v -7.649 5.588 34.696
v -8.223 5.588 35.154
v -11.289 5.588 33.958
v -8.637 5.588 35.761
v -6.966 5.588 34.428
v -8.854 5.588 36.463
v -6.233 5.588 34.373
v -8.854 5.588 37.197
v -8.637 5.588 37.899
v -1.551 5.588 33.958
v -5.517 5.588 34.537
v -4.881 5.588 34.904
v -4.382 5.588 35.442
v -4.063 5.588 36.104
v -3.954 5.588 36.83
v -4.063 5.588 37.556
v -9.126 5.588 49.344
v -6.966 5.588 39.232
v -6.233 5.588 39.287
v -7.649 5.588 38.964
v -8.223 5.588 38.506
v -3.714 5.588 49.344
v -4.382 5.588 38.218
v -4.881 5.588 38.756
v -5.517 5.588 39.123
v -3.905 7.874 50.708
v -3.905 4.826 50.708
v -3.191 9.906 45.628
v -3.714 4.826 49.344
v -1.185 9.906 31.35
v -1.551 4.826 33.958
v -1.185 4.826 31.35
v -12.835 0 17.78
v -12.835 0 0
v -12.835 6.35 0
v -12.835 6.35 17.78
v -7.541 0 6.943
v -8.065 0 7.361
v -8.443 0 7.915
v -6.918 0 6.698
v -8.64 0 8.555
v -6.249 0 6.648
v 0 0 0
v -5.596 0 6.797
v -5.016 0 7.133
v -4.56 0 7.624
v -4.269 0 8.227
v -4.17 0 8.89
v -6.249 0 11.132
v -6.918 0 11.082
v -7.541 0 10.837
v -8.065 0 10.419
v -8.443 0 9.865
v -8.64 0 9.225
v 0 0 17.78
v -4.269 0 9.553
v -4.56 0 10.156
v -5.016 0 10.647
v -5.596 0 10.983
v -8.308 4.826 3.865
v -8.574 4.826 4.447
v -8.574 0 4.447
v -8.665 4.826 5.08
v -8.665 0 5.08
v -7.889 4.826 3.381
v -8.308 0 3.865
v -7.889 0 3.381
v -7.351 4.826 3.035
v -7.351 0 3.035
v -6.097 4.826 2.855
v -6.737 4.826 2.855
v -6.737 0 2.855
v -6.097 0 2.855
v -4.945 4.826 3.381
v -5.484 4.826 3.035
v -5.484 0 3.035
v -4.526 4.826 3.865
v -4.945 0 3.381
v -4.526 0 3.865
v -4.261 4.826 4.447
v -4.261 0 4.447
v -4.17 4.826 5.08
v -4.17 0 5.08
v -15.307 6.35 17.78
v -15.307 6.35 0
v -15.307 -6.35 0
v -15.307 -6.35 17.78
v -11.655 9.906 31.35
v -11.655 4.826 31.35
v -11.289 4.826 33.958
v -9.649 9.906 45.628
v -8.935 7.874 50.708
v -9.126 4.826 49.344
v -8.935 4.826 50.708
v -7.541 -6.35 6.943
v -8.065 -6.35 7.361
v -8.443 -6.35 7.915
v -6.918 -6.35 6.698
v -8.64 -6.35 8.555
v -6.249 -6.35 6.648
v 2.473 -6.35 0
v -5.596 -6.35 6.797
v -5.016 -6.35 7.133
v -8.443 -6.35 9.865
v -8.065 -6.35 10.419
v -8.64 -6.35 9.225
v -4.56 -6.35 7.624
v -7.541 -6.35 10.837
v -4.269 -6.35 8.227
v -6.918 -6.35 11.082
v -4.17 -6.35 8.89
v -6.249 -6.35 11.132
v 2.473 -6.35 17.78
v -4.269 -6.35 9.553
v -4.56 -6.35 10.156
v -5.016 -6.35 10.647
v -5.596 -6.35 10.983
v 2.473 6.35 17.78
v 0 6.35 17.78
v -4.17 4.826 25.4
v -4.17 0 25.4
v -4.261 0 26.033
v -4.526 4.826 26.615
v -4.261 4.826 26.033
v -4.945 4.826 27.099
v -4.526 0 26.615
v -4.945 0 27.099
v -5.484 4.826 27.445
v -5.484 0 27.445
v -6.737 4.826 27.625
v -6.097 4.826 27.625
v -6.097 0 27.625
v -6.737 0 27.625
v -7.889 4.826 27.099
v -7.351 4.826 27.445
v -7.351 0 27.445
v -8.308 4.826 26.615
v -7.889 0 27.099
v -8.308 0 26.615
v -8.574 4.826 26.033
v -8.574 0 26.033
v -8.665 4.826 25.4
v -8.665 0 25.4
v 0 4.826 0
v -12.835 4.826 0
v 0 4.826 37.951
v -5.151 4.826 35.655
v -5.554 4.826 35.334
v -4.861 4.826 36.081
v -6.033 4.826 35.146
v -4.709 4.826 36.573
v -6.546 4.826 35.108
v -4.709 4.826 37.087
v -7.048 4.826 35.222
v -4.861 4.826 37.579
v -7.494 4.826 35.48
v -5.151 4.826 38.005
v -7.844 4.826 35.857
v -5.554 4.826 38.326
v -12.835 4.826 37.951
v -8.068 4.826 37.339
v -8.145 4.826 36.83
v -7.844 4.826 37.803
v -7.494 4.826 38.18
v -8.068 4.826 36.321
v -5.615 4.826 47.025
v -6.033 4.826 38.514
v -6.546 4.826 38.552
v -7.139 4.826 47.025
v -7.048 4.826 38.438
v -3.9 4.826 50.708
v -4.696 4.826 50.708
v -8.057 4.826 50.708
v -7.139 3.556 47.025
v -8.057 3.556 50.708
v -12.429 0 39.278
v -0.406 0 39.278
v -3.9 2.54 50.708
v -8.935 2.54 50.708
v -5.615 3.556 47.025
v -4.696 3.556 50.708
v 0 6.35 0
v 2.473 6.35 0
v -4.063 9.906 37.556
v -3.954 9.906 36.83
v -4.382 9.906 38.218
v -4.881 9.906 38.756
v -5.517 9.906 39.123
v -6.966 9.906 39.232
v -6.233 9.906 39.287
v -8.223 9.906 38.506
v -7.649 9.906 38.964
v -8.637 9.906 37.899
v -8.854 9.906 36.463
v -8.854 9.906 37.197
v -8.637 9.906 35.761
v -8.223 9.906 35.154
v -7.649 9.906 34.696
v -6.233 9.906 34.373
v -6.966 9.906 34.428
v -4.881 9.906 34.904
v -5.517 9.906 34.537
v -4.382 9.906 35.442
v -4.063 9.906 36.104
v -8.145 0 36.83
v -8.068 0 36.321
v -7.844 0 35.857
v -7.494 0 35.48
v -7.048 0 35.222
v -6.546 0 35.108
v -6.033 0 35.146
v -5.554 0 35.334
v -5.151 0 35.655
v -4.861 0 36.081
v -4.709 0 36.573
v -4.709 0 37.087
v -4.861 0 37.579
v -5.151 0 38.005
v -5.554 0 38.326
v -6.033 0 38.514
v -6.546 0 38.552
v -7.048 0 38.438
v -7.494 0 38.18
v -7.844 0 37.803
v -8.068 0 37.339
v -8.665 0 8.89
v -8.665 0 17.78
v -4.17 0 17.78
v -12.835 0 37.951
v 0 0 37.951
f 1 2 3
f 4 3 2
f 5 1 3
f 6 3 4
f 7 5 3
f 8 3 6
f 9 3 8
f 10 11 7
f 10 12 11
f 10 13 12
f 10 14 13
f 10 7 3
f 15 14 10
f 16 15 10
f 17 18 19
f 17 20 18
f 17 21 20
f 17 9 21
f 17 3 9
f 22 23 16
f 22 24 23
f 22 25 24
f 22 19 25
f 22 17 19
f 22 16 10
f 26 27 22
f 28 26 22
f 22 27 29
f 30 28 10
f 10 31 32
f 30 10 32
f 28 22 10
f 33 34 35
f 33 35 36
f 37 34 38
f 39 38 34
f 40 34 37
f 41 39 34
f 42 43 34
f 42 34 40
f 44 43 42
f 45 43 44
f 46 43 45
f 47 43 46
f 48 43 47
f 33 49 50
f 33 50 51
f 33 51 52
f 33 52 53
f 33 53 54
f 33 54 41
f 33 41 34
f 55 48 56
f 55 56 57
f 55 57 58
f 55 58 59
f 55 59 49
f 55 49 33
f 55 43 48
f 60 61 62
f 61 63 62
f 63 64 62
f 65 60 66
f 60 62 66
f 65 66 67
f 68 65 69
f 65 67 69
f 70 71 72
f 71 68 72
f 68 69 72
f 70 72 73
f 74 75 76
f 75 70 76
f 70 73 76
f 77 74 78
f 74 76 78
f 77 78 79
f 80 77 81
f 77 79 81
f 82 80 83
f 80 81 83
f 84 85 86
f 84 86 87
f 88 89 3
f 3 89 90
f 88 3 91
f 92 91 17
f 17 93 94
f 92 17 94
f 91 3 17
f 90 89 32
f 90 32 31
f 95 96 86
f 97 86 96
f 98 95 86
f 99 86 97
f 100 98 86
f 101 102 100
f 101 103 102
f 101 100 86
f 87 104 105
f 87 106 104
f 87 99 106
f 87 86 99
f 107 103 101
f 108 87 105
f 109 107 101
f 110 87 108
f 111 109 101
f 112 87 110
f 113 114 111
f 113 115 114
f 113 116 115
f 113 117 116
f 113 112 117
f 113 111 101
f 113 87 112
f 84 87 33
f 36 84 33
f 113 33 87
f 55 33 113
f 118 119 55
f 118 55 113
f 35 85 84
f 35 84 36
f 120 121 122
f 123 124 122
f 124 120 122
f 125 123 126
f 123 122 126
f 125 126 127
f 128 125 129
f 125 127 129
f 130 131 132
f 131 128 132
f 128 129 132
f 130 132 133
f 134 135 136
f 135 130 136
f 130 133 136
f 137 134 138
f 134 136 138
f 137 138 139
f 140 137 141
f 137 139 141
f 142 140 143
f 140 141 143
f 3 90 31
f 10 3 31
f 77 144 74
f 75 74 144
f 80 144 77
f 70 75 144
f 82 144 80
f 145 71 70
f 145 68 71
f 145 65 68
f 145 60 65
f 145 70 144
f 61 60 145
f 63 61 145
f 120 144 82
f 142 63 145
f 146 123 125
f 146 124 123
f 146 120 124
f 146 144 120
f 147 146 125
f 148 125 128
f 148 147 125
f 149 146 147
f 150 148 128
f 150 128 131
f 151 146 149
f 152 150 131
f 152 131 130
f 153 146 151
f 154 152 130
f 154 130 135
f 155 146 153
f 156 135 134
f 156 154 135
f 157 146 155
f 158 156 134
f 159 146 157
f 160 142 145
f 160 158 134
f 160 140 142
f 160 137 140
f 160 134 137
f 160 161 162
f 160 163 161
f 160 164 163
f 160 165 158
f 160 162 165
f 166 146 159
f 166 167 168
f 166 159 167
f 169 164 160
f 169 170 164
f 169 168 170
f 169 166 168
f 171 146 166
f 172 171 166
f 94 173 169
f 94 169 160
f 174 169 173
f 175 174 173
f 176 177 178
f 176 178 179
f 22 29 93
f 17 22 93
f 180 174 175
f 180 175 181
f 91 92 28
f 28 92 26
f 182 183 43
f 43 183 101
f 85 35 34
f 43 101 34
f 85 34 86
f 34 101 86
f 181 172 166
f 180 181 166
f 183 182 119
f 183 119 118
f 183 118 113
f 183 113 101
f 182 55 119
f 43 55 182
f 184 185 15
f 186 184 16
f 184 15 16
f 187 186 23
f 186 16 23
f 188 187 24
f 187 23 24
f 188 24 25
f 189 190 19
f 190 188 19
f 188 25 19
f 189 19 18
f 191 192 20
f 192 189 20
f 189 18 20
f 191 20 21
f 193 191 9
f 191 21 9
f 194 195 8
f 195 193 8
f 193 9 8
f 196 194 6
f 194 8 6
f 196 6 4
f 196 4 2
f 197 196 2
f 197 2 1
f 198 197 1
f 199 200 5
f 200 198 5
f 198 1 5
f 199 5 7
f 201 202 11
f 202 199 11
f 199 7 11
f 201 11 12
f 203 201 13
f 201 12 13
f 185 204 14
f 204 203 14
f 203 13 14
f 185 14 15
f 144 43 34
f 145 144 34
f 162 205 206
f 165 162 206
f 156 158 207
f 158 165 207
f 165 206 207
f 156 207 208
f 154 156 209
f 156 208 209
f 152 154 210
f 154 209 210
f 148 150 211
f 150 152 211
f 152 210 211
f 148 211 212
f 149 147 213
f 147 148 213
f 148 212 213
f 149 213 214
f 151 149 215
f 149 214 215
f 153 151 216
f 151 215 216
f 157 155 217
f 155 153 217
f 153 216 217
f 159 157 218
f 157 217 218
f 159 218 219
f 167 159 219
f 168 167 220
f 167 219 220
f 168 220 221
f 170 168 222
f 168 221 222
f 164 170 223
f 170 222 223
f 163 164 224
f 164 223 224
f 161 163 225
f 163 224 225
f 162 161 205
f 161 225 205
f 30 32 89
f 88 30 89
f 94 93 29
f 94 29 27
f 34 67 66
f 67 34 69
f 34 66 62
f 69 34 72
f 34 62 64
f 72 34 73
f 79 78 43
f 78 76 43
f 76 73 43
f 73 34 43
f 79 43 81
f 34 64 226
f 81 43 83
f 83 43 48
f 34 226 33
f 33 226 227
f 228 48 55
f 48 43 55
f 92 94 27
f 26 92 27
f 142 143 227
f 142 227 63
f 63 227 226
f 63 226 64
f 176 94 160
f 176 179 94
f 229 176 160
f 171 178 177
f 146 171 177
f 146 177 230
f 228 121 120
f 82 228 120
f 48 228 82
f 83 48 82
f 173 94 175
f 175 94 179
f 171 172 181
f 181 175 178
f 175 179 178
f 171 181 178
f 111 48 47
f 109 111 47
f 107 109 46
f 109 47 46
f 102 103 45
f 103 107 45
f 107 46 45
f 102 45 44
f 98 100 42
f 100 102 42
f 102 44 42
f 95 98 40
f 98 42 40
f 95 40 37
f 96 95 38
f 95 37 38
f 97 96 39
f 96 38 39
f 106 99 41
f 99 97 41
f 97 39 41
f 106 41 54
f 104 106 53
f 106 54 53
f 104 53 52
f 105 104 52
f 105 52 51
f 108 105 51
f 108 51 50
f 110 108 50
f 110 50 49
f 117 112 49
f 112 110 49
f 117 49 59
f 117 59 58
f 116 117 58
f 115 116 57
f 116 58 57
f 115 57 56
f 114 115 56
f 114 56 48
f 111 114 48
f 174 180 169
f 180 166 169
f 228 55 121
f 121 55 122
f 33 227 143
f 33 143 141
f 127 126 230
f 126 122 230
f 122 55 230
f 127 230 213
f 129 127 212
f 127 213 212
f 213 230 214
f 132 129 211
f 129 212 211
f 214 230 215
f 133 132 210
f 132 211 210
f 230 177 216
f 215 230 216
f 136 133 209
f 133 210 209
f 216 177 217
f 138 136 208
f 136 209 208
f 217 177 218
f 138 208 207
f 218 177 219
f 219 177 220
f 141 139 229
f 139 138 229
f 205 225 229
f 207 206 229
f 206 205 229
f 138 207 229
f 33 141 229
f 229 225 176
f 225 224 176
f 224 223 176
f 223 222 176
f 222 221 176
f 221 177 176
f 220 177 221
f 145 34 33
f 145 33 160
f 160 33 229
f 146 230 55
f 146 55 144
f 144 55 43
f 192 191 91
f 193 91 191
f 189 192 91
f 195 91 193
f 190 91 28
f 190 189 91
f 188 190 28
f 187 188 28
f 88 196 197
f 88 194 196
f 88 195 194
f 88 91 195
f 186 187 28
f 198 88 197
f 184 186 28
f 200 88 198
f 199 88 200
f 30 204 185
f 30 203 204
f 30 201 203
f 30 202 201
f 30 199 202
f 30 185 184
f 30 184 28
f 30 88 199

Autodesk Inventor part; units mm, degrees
ref_plane "YZ Plane" through (0, 0, 0) normal (1, 0, 0) x (0, 1, 0)
sketch "Sketch1" plane through (0, 0, 0) normal (0, 1, 0) x (-1, 0, 0)
  line L0 (0, 0) -> (12.8347, 0)
  line L1 (12.8347, 0) -> (12.8347, 37.9512)
  line L2 (8.9346, 50.7079) -> (3.9001, 50.7079)
  line L3 (0, 37.9512) -> (0, 0)
  line L4 (8.9346, 50.7079) -> (12.8347, 37.9512)
  line L5 (3.9001, 50.7079) -> (0, 37.9512)
  line L6 (8.4266, 50.7079) -> (8.9346, 50.7079) construction
  circle A0 centre (6.4174, 36.83) radius 1.7272
  arc A1 (4.1695, 5.08) -> (8.6653, 5.08) centre (6.4174, 5.08) ccw
  arc A2 (8.6653, 25.4) -> (4.1695, 25.4) centre (6.4174, 25.4) ccw
  line L7 (8.6653, 25.4) -> (8.6653, 5.08)
  line L8 (4.1695, 25.4) -> (4.1695, 5.08)
  dimension "d10" = 3.4544
  dimension "d12" = 4.4958
  dimension "d13" = 5.08
  dimension "d14" = 4.4958
  dimension "d15" = 25.4
  dimension "d52" = 6.4173
  dimension "d53" = 12.8347
  dimension "d57" = 163
  dimension "d58" = 163
  dimension "d59" = 5.0345
  dimension "d60" = 6.4173
  dimension "d61" = 6.4173
ref_plane "Work Plane2" through (0, 4.826, 0) normal (0, 1, 0) x (1, 0, 0)
extrude "Extrusion3" add sketch "Sketch1" along normal blind 4.826
chamfer "Chamfer2" distance 2.54 distance2 11.43 1 edges at (-6.4174, 0, 50.7079) measured on face at (-7.2564, 1.6087, 50.7079)
sketch "Sketch12" plane through (0, 4.826, 0) normal (0, 1, 0) x (1, 0, 0)
  line L0 (-3.9001, -50.7079) -> (-8.9346, -50.7079) projected
  line L1 (-4.6964, -50.7079) -> (-5.6147, -47.0249)
  line L2 (-5.6147, -47.0249) -> (-7.1387, -47.0249)
  line L3 (-7.1387, -47.0249) -> (-8.057, -50.7079)
  line L4 (-8.9346, -50.7079) -> (-3.9001, -50.7079) projected
  point P0 (0, 0)
  dimension "d67" = 1.524
  dimension "d68" = 104
  dimension "d69" = 104
  dimension "d70" = 3.683
  dimension "d71" = 0.8776
  dimension "d72" = 5.0345
extrude "Extrusion4" cut sketch "Sketch12" against normal blind 1.27
sketch "Sketch13" plane through (0, 4.826, 0) normal (0, 1, 0) x (1, 0, 0)
  line L0 (-12.8347, -37.9512) -> (-8.9346, -50.7079) projected
  line L1 (-8.9346, -50.7079) -> (-3.9054, -50.7079)
  line L2 (-3.9054, -50.7079) -> (-1.1849, -31.3501)
  line L3 (-1.1849, -31.3501) -> (-11.6552, -31.3501)
  line L4 (-11.6552, -31.3501) -> (-8.9346, -50.7079)
  circle A0 centre (-6.4174, -36.83) radius 2.4638
  circle A1 centre (-6.4174, -36.83) radius 1.7272 projected
  line L5 (-3.9001, -50.7079) -> (-8.9346, -50.7079) projected
  point P0 (0, 0)
  dimension "d75" = 4.9276
  dimension "d76" = 5.0292
  dimension "d86" = 98
  dimension "d88" = 98
extrude "Extrusion5" add sketch "Sketch13" along normal blind 5.08 contours L4 L3 L2 L1
split body "Split1" result two bodies by plane through (0, 4.826, 0) normal (0, 1, 0) first body at (-6.5181, 9.406, 46.8972)
chamfer "Chamfer3" distance 5.08 distance2 2.032 1 edges at (-6.42, 9.906, 50.7079) measured on face at (-6.5181, 9.906, 46.8972)
sketch "Sketch14" plane through (0, 4.826, 0) normal (0, -1, 0) x (1, 0, 0)
  line L0 (-3.7137, 49.3439) -> (-9.1263, 49.3439)
  line L1 (-9.1263, 49.3439) -> (-11.2887, 33.9578)
  line L2 (-11.2887, 33.9578) -> (-1.5513, 33.9578)
  line L3 (-1.5513, 33.9578) -> (-3.7137, 49.3439)
  line L4 (-1.1849, 31.3501) -> (-3.9054, 50.7079) projected
  line L5 (-8.9346, 50.7079) -> (-11.6552, 31.3501) projected
  point P0 (0, 0)
extrude "Extrusion6" cut sketch "Sketch14" against normal blind 0.762 bodies 2
sketch "Sketch15" plane through (0, 0, 0) normal (0, -1, 0) x (1, 0, 0)
  line L0 (-15.3074, 17.78) -> (2.4726, 17.78)
  line L1 (2.4726, 17.78) -> (2.4726, 0)
  line L2 (2.4726, 0) -> (-15.3074, 0)
  line L3 (-15.3074, 0) -> (-15.3074, 17.78)
  line L4 (0, 0) -> (-12.8347, 0) projected
  circle A0 centre (-6.4174, 8.89) radius 2.2479
  point P0 (-6.4174, 0)
  dimension "d89" = 17.78
  dimension "d90" = 17.78
  dimension "d91" = 4.4958
  dimension "d92" = 8.89
  dimension "d93" = 8.89
extrude "Extrusion7" add sketch "Sketch15" along normal blind 6.35 bodies 3
sketch "Sketch16" plane through (0, 4.826, 0) normal (0, 0, -1) x (-1, 0, 0)
  line L0 (-2.4726, -4.826) -> (0, -4.826) projected
  line L1 (12.8378, -4.826) -> (0, -4.826)
ref_plane "Work Plane3" through (-15.3074, 0, 0) normal (0, 1, 0) x (1, 0, 0)
split body "Split2" result two bodies by plane through (-15.3074, 0, 0) normal (0, 1, 0) bodies 3 first body at (-11.4449, 4.326, 21.1171)
sketch "Sketch17" plane through (0, 0, 0) normal (0, 1, 0) x (1, 0, 0)
  line L0 (0, -37.9512) -> (0, 0) projected
  line L1 (0, -17.78) -> (2.4726, -17.78)
  line L2 (2.4726, -17.78) -> (2.4726, 0)
  line L3 (2.4726, 0) -> (0, 0)
  line L4 (0, 0) -> (0, -17.78)
  line L5 (2.4726, 0) -> (-15.3074, 0) projected
  line L6 (-12.8347, 0) -> (-12.8347, -37.9512) projected
  line L7 (-15.3074, 0) -> (-12.8347, 0)
  line L8 (-12.8347, 0) -> (-12.8347, -17.78)
  line L9 (-12.8347, -17.78) -> (-15.3074, -17.78)
  line L10 (-15.3074, -17.78) -> (-15.3074, 0)
  line L11 (2.4726, -17.78) -> (2.4726, 0) projected
  line L12 (-15.3074, -17.78) -> (2.4726, -17.78) projected
  point P0 (2.4726, -8.89)
  point P1 (-14.071, -17.78)
extrude "Extrusion8" add sketch "Sketch17" along normal blind 6.35 contours L0 L3 L2 L1 | L9 L10 L5 L6 bodies 5
equation "\"d52\" = 0.5 * d53"
equation "\"d60\" = 0.5 * d53"
equation "\"d61\" = 0.5 * d53"
equation "\"d71\" = -0.25 * d67 + 0.25 * d72"
equation "\"d23\" = 0.5 * d24"
equation "\"d24\" = 12.7"
properties part number "clamp_v2_1inch_slot_v1"
